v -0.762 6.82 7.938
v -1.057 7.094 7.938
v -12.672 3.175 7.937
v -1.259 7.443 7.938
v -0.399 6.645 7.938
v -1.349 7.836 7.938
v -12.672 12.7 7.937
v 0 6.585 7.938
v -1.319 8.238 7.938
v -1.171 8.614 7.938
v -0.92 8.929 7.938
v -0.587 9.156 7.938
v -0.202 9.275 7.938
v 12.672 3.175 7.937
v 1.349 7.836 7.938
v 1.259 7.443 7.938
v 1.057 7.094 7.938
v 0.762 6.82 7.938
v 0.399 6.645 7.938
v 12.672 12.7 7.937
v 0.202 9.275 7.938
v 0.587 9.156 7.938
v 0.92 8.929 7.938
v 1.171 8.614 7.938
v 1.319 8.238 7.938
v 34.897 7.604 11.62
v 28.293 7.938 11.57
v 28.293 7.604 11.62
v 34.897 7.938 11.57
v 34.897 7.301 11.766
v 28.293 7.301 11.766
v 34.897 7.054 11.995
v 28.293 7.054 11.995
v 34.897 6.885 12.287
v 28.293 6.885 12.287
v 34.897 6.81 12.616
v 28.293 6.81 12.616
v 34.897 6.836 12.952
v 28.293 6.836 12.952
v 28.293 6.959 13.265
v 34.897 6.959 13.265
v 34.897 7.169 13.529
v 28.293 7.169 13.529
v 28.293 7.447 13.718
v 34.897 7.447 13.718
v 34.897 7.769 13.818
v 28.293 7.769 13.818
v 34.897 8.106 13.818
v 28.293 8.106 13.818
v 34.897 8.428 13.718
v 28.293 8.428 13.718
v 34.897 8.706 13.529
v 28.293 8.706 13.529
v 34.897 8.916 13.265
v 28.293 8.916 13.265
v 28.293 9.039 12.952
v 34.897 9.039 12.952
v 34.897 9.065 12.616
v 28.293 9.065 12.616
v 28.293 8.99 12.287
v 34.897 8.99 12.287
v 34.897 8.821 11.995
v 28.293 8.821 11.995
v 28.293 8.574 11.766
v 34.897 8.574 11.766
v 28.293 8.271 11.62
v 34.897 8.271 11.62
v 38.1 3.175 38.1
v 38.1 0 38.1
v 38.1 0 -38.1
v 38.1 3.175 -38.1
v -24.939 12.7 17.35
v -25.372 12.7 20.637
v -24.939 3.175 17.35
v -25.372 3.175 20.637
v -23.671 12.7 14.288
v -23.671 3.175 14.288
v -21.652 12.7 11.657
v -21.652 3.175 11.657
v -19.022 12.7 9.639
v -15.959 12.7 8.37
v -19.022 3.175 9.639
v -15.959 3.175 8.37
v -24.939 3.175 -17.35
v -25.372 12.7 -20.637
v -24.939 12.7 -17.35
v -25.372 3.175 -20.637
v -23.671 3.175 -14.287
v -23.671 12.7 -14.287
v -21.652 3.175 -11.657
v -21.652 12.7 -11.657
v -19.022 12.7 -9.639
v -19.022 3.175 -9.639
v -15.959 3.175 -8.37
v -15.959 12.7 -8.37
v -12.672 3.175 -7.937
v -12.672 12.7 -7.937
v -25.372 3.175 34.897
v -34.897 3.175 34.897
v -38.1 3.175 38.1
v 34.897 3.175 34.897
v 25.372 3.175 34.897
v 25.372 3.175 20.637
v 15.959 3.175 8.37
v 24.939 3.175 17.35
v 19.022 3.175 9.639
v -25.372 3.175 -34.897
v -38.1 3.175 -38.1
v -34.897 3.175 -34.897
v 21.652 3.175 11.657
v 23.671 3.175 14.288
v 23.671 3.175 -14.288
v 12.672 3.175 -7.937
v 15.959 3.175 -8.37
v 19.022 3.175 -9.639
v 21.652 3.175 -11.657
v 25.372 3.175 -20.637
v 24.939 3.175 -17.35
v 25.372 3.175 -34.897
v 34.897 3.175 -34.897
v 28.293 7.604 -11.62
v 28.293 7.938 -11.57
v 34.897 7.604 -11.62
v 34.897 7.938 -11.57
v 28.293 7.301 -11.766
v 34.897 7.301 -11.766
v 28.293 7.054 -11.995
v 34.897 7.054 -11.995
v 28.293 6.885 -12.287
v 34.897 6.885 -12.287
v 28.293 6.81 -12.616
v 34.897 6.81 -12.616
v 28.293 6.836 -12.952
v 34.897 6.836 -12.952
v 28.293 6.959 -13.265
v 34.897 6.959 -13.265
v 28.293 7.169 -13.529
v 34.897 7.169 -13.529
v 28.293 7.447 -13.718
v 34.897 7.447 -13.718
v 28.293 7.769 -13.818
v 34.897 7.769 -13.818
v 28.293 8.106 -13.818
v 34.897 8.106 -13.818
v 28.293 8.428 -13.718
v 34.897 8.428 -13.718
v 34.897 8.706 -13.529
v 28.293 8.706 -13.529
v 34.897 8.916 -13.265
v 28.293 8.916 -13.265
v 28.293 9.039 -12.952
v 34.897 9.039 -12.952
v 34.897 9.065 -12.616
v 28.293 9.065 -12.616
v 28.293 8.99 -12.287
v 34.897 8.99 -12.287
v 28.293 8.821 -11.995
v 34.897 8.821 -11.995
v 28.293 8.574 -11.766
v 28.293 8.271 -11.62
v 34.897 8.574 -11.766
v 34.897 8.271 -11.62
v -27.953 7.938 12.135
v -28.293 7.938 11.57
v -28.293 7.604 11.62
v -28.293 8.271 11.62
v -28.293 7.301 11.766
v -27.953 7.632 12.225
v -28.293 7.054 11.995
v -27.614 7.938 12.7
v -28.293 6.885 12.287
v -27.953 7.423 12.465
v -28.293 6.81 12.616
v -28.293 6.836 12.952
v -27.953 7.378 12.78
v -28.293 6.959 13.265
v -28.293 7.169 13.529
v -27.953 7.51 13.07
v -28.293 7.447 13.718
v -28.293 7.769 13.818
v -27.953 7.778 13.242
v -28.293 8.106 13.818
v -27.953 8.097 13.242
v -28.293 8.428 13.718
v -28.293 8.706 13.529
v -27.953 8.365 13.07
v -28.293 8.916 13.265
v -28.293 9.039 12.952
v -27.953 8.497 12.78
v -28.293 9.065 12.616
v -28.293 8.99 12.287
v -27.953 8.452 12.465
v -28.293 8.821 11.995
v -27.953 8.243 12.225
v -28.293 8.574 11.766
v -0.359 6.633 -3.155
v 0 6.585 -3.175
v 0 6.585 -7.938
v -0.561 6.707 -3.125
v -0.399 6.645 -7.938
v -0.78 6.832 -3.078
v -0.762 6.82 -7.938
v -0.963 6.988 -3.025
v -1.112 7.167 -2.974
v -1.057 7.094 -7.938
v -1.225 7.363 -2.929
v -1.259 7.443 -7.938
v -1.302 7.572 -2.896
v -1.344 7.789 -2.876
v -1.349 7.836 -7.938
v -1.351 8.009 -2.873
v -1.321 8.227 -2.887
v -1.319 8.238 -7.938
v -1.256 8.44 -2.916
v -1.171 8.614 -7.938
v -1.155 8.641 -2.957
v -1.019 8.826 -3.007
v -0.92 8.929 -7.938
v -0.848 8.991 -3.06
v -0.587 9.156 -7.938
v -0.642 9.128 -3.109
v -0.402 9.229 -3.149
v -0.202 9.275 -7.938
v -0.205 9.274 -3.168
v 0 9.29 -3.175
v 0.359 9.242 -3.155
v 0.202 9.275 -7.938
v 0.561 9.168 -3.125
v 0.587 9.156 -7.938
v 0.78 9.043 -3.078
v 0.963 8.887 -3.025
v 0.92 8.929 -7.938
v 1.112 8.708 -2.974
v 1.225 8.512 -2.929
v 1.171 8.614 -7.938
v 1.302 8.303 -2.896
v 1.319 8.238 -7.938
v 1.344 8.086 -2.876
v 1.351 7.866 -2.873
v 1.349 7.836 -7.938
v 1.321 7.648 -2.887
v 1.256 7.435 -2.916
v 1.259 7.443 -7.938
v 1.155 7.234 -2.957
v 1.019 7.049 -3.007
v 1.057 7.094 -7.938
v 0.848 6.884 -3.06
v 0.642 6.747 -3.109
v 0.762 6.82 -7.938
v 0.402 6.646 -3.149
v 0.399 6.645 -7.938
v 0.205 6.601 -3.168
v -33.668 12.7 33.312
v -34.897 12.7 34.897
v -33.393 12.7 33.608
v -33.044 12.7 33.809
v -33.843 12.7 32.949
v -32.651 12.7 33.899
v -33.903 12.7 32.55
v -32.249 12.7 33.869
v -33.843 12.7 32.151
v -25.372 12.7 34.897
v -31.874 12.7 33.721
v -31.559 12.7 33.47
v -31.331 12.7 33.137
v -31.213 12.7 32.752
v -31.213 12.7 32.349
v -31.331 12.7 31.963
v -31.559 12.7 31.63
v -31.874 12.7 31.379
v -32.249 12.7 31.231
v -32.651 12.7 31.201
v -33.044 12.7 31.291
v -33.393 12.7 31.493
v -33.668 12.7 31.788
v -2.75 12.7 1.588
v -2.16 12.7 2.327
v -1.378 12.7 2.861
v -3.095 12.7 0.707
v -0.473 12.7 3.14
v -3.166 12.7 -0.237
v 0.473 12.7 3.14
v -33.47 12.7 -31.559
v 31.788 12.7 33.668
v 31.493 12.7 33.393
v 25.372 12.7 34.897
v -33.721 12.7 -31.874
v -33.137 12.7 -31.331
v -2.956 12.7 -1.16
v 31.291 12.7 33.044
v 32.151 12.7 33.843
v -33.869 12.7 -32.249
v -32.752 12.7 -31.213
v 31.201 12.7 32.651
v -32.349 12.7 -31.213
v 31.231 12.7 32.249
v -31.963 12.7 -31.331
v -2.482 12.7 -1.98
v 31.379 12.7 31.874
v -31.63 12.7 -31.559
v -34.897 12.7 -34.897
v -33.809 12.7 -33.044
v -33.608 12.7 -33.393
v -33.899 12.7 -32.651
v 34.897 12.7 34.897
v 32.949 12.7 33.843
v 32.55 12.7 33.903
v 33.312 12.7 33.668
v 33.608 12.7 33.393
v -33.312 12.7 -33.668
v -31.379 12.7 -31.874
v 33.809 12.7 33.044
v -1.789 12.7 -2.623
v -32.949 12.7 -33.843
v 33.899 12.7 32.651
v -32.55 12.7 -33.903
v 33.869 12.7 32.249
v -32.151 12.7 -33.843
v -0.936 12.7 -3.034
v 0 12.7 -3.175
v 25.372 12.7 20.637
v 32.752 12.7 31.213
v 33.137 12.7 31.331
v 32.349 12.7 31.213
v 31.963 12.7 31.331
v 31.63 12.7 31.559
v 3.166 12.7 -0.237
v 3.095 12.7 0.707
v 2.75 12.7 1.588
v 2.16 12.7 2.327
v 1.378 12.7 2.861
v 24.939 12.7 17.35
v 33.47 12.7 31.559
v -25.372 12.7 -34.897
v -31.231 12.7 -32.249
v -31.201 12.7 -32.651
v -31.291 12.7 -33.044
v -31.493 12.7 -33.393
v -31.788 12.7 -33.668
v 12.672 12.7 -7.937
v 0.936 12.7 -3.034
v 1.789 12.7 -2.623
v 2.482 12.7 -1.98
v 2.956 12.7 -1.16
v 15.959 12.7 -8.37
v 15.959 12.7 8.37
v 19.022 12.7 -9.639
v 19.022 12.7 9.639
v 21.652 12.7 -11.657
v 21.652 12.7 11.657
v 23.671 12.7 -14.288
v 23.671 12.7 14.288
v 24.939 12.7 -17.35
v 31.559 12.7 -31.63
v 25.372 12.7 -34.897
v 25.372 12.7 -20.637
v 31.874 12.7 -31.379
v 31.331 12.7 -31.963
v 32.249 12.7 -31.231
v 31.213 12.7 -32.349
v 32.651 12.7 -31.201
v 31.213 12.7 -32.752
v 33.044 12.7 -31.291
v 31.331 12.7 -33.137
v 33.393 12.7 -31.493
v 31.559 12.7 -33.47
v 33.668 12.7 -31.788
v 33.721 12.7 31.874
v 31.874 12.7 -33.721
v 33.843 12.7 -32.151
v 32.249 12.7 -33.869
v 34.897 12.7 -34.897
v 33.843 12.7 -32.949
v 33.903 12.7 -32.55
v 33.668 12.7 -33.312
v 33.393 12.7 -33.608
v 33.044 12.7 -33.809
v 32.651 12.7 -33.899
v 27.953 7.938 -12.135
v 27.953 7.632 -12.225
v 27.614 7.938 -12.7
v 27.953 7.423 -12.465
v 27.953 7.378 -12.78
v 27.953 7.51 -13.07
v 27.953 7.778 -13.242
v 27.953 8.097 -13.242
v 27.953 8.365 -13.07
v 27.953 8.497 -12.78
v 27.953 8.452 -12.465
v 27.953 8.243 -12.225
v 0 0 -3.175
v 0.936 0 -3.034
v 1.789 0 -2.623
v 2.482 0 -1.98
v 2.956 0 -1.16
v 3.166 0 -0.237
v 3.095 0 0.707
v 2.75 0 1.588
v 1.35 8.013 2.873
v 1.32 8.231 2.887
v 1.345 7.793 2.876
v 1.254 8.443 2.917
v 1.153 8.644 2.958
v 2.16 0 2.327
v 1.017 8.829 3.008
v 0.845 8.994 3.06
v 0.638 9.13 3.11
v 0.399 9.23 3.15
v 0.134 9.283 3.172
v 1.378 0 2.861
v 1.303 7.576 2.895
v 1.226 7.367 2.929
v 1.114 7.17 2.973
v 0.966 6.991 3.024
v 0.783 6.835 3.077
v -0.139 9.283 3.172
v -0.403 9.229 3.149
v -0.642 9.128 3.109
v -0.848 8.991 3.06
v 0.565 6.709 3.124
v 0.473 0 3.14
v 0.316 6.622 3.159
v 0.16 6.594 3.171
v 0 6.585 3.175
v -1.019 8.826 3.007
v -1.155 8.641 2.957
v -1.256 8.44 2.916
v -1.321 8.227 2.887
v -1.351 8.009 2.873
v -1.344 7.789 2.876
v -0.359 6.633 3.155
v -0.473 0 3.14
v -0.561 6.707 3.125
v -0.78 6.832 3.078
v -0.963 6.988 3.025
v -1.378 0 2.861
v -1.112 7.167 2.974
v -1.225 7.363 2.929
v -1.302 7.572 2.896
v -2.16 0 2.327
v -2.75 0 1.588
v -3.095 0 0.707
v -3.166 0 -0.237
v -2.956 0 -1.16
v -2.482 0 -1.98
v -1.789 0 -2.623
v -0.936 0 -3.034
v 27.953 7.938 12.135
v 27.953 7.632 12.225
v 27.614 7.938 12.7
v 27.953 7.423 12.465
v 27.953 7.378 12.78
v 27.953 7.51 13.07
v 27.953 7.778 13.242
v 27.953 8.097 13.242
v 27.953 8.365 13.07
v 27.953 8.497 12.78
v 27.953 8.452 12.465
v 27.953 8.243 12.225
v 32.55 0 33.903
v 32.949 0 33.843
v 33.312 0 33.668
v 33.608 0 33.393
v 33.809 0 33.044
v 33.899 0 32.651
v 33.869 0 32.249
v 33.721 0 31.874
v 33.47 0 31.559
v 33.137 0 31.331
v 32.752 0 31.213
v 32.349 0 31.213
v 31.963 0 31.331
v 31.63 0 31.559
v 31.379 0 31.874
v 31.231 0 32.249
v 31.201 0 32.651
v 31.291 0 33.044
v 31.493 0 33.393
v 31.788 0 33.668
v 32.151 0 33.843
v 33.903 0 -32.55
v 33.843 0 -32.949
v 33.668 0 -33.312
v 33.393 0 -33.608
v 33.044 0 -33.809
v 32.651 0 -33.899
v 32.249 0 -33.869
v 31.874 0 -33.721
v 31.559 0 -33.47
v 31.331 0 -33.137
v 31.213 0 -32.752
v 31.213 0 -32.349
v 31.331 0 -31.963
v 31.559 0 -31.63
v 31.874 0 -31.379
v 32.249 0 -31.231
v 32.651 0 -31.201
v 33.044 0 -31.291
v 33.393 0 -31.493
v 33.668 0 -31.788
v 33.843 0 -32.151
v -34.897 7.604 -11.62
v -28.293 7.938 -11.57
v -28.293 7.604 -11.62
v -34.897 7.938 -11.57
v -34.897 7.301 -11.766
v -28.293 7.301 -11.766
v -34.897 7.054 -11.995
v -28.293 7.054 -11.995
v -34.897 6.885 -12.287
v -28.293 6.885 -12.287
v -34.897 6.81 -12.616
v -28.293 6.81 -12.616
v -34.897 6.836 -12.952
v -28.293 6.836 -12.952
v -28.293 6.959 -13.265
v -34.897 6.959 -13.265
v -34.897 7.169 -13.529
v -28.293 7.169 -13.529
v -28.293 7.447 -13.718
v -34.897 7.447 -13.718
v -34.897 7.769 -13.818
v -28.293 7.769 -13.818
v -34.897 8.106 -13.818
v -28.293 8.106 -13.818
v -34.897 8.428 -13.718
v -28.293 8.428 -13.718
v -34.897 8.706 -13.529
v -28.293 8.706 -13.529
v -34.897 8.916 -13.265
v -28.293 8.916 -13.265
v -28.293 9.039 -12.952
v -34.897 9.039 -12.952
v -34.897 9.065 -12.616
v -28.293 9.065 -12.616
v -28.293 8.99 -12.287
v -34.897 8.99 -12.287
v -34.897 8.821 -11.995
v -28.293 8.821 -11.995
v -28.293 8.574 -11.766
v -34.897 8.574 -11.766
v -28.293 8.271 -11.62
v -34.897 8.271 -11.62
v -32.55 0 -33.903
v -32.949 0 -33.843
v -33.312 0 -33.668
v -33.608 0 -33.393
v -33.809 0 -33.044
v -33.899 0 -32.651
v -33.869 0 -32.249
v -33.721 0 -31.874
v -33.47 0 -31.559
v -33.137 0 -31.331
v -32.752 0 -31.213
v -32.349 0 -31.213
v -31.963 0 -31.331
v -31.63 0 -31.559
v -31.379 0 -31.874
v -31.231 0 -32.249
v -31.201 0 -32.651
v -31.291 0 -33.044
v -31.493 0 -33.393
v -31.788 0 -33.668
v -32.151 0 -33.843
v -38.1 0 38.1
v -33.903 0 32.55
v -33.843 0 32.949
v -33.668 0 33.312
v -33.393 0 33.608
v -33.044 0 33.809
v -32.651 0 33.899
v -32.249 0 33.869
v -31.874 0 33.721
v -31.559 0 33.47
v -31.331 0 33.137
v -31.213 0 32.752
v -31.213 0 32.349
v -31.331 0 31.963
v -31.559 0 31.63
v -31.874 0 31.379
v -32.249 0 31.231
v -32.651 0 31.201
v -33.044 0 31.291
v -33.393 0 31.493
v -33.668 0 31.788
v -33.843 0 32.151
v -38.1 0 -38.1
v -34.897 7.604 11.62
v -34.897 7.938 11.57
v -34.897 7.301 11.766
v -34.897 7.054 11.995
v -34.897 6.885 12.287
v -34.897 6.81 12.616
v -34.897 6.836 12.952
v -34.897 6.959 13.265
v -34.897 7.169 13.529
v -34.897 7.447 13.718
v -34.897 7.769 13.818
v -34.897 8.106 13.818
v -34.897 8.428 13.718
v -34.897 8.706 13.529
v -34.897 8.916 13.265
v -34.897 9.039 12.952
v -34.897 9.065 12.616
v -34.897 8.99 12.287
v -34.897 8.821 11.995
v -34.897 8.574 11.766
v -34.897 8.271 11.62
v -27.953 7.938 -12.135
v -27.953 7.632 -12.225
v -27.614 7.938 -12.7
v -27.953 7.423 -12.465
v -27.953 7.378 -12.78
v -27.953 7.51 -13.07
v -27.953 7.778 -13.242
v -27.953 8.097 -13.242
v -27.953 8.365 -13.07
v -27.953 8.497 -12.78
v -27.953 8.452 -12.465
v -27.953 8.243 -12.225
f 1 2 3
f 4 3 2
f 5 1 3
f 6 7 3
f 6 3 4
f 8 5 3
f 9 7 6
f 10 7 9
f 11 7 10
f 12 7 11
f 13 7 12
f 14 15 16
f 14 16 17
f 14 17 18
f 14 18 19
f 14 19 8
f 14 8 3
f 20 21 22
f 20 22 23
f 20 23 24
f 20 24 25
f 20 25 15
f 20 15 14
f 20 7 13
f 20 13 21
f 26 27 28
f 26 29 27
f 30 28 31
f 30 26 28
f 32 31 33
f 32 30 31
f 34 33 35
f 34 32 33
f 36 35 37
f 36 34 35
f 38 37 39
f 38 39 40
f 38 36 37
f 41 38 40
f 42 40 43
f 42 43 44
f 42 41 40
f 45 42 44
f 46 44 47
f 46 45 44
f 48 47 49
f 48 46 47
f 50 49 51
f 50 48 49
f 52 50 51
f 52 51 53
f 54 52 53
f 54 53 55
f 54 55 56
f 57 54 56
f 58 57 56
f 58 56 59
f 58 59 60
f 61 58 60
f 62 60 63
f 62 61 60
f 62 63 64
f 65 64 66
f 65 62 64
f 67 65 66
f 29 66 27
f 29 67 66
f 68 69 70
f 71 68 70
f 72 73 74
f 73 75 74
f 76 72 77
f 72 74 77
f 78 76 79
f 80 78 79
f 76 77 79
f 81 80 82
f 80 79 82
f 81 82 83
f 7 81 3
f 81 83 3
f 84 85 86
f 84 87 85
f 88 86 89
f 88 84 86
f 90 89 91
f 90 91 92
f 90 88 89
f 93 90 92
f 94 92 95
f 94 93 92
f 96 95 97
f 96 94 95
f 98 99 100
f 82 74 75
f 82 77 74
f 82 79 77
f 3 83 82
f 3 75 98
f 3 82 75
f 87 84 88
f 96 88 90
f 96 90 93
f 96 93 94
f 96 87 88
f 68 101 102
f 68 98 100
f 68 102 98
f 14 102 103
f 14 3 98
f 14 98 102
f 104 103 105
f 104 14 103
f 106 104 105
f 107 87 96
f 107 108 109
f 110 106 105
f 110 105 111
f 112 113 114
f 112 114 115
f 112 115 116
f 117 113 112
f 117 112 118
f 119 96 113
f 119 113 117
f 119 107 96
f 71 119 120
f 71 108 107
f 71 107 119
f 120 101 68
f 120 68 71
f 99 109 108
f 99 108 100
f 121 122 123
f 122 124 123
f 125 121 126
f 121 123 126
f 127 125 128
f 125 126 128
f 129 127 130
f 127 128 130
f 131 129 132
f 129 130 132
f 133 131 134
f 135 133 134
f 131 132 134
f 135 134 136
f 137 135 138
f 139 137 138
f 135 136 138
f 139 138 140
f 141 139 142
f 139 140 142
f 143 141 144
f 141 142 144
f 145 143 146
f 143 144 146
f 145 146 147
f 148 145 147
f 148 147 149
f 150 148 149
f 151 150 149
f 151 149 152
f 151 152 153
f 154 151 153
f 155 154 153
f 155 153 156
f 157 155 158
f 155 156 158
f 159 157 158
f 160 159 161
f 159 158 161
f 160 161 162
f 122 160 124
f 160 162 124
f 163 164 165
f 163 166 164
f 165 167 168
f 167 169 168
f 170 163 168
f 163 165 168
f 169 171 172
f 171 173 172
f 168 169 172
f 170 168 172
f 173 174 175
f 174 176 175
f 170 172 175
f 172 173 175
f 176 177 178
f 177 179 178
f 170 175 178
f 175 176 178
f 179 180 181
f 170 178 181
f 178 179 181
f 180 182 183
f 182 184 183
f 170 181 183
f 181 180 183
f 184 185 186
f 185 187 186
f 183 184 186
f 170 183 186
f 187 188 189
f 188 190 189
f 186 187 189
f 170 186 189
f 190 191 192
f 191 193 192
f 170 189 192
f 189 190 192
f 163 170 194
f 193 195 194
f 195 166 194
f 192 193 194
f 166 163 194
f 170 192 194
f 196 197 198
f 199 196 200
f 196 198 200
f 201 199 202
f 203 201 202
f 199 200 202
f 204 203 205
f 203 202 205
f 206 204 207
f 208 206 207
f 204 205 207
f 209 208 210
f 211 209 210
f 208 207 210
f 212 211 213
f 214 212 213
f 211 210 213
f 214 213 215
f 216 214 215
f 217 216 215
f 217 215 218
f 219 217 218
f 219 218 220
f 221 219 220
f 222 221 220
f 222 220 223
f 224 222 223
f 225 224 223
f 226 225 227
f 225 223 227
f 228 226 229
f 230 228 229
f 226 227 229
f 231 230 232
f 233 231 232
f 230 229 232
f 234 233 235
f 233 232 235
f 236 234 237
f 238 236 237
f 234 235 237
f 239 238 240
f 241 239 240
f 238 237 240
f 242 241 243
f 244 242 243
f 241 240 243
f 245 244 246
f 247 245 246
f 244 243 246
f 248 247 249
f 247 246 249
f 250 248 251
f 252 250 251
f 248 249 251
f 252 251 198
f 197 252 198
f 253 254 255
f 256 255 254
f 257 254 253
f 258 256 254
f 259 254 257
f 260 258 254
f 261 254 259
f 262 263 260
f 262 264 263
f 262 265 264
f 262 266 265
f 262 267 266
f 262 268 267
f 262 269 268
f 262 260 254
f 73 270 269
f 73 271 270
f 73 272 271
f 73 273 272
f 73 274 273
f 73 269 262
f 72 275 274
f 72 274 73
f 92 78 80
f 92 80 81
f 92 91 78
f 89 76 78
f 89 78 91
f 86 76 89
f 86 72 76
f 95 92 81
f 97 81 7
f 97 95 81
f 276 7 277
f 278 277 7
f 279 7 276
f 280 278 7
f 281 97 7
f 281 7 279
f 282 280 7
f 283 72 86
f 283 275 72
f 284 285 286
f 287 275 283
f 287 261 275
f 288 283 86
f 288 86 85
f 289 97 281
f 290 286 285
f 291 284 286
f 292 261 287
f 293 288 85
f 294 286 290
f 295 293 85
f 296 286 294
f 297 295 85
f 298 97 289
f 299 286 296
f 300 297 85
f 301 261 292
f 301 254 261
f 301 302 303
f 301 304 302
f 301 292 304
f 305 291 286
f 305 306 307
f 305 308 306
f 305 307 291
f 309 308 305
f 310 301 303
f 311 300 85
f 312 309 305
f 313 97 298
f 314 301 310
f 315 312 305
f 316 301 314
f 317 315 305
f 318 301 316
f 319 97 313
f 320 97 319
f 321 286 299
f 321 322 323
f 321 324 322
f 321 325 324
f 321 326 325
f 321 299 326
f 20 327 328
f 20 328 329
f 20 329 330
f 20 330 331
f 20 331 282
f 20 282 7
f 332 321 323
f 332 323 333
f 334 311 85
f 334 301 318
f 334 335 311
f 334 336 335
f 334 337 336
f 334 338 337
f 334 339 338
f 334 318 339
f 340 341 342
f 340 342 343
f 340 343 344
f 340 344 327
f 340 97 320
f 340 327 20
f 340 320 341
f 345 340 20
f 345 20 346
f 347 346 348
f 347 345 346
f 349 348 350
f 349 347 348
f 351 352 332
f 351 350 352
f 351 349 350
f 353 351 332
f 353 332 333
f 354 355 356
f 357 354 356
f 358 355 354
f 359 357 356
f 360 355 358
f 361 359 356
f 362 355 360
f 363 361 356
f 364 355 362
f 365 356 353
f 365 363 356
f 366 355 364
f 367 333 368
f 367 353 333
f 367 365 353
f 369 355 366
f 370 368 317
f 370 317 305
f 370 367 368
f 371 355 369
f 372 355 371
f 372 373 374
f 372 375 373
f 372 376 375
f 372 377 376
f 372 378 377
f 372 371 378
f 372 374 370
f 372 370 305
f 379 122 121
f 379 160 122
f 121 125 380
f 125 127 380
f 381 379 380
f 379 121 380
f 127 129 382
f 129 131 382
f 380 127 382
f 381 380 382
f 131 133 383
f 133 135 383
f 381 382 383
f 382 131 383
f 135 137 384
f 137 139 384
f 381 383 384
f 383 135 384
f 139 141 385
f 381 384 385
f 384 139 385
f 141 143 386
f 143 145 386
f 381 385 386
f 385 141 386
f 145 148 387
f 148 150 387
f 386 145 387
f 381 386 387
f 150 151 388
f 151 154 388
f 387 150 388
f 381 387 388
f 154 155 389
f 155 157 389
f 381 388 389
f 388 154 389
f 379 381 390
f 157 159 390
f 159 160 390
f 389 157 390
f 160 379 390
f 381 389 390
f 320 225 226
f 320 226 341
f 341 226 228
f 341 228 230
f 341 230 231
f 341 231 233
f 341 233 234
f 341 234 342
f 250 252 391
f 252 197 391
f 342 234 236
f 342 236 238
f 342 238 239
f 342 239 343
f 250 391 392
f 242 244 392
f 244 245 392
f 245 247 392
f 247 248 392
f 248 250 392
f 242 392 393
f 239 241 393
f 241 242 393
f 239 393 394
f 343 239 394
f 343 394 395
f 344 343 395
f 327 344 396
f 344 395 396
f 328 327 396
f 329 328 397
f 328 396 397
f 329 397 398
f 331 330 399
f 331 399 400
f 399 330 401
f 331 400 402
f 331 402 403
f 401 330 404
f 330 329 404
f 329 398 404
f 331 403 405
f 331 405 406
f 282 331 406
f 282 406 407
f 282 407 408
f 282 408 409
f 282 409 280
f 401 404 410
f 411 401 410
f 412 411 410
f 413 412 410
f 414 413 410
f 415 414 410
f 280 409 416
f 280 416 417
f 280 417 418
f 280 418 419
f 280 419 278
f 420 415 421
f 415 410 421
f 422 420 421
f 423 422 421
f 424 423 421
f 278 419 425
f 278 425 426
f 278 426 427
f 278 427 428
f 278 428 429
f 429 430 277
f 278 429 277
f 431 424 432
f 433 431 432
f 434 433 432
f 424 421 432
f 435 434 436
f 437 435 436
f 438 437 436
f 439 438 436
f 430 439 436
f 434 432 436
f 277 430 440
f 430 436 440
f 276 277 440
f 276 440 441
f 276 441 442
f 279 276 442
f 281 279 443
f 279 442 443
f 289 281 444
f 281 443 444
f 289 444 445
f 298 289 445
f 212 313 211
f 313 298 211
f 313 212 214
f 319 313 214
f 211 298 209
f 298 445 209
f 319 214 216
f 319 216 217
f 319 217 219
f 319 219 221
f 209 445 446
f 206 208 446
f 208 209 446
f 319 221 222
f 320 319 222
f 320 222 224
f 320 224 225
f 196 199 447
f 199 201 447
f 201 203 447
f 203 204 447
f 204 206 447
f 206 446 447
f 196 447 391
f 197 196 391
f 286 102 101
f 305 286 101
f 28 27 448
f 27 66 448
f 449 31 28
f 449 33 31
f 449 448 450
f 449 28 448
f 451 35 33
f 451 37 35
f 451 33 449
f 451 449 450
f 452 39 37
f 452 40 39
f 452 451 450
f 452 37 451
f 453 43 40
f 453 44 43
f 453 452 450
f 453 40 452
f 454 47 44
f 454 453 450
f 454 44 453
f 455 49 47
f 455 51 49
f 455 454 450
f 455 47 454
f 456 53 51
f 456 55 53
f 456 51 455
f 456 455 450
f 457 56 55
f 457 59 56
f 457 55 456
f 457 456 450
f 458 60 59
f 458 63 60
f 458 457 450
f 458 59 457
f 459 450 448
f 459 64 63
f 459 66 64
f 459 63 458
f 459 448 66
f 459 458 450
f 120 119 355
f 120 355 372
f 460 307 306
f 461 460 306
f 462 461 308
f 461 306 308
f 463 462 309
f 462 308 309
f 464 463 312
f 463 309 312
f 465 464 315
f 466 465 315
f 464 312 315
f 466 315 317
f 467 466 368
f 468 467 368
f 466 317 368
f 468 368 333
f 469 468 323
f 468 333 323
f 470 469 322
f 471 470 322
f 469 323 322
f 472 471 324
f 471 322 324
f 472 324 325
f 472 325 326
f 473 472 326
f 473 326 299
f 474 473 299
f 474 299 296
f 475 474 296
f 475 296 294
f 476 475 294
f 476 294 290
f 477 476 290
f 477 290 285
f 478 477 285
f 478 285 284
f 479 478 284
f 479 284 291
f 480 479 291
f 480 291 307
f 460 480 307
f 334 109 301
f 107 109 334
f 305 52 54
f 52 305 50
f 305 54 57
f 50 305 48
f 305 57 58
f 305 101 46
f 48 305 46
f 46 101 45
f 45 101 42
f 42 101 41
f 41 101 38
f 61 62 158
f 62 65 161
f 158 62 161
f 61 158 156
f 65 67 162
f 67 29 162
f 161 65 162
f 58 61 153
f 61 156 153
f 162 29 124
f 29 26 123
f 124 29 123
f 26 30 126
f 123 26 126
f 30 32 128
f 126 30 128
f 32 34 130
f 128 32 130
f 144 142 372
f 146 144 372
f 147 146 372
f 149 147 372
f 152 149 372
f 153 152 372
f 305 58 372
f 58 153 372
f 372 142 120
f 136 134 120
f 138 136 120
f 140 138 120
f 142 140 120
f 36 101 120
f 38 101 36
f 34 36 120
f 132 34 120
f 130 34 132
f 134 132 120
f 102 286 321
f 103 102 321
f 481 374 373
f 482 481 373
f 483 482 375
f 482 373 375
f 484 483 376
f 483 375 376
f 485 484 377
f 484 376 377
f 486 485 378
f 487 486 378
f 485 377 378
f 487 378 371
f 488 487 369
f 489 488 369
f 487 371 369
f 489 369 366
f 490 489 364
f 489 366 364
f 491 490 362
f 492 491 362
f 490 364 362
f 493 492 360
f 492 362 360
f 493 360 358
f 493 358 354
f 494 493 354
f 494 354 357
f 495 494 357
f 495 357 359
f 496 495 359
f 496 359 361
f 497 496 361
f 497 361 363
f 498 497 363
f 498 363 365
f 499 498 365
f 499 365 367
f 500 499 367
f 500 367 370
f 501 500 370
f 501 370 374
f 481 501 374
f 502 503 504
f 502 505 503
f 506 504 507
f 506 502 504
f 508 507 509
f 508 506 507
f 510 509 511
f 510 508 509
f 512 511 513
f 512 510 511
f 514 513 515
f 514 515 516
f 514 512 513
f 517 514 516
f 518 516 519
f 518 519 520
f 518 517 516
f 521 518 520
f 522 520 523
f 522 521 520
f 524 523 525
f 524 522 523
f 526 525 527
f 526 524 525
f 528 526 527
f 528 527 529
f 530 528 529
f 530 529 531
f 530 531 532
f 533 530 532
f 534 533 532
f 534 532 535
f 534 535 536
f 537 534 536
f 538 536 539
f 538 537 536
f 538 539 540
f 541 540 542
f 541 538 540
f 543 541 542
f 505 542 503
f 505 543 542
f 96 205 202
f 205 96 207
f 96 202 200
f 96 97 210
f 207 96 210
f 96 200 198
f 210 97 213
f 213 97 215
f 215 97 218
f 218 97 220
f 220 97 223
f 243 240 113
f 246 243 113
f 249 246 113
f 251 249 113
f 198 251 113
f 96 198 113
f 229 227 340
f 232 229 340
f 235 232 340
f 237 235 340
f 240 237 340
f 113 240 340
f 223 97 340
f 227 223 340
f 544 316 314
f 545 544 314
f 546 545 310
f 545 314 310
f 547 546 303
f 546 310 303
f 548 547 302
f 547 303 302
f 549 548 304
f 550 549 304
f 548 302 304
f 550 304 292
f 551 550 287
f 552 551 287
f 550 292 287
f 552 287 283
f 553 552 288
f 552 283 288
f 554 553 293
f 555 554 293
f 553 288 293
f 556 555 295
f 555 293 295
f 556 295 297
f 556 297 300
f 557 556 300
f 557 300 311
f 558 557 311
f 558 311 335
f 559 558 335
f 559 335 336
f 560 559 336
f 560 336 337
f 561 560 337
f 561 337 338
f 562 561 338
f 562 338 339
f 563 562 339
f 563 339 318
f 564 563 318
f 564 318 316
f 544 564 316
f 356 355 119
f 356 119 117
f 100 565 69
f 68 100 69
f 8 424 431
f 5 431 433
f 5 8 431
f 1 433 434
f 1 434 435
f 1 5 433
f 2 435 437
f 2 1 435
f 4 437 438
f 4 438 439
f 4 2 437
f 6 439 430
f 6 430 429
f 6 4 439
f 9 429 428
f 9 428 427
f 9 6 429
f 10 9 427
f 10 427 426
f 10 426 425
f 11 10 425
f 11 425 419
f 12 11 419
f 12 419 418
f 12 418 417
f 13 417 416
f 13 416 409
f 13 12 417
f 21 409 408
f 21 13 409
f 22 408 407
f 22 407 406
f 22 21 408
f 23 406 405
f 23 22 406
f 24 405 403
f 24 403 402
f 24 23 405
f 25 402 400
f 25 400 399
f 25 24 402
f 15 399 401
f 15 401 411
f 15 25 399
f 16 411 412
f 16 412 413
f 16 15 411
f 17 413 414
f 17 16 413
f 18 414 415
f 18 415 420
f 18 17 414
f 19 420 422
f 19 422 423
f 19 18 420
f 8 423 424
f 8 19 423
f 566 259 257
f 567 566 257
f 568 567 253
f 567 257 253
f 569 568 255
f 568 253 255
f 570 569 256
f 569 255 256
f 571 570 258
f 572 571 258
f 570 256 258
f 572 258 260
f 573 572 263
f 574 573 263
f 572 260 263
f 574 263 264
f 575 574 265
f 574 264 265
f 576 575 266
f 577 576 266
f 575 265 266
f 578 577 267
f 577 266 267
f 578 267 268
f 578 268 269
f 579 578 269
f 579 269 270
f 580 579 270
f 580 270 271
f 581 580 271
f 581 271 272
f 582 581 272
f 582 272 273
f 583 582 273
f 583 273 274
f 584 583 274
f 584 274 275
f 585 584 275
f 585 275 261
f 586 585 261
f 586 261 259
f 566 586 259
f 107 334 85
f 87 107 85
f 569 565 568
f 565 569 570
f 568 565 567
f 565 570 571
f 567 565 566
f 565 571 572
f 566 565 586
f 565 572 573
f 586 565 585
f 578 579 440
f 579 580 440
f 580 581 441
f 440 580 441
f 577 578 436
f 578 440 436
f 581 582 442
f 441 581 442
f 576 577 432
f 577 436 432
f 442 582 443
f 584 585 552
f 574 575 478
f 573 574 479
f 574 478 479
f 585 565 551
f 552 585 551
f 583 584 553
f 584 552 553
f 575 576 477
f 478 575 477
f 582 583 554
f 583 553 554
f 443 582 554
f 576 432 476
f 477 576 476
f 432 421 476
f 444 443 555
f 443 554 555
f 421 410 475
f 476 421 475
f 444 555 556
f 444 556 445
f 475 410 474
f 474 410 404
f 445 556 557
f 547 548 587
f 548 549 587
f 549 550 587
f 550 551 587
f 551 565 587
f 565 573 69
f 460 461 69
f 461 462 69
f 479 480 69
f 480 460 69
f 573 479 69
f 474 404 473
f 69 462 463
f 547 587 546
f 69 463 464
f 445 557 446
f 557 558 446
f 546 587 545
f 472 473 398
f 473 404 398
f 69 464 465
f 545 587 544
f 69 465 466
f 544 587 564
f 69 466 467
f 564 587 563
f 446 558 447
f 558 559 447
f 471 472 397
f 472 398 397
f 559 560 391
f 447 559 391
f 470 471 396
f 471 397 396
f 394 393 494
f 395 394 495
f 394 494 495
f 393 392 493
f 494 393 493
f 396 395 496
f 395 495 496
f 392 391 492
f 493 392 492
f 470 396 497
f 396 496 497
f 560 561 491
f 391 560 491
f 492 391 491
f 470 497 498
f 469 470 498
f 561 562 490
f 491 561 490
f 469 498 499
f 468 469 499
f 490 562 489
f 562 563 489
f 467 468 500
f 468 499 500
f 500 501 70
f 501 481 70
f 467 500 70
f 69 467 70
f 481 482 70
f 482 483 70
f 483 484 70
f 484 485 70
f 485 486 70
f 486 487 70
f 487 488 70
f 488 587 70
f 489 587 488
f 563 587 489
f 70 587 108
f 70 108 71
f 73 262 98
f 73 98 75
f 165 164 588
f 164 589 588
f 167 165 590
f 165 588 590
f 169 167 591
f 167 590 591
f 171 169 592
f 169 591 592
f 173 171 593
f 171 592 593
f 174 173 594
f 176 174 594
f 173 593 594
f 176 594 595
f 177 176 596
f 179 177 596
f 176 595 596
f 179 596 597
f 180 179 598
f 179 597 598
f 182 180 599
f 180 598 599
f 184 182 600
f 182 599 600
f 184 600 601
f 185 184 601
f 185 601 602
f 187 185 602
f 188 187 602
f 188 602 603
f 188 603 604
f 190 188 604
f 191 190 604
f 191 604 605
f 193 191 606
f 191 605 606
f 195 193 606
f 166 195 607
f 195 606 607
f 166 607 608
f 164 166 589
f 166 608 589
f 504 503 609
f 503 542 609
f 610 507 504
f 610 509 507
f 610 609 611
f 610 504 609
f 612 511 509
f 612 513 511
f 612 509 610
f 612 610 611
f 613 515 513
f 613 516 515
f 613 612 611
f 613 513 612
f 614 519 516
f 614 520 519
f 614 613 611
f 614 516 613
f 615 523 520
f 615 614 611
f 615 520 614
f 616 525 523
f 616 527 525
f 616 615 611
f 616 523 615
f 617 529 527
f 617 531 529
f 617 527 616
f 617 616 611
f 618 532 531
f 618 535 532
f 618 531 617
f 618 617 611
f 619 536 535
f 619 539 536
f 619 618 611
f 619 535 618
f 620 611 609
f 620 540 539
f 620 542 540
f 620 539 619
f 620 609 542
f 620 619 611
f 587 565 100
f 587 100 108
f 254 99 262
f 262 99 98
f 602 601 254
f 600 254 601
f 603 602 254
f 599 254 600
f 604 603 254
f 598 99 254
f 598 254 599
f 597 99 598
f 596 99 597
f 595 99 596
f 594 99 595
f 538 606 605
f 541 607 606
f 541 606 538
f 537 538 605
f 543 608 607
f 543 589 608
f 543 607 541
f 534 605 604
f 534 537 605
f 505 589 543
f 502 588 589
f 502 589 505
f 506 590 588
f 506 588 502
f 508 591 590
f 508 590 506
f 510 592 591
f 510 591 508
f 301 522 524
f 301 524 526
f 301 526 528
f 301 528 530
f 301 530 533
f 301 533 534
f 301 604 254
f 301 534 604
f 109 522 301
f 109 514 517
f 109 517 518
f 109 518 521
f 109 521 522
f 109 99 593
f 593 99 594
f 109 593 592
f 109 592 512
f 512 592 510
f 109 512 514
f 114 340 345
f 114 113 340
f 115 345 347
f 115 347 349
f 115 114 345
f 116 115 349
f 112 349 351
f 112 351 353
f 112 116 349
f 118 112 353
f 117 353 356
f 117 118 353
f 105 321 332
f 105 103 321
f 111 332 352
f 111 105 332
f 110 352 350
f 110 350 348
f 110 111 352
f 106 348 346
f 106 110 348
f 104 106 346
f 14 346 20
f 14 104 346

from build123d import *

# Parameters (mm, degrees)
SKETCH1_W             = 76.2
SKETCH1_H             = 76.2
BOSS_EXTRUDE1_DEPTH   = 3.175
SKETCH2_W             = 69.79412
SKETCH2_H             = 69.79412
BOSS_EXTRUDE2_DEPTH   = 9.525
F_6_32_TAPPED_HOLE1_D = 2.7051
CIRPATTERN1_COUNT     = 4
SKETCH14_R            = 3.175
CUT_EXTRUDE1_DEPTH    = 56.358016583
SKETCH15_W            = 50.74412
SKETCH15_H            = 26.95956
CUT_EXTRUDE2_DEPTH    = 9.525
FILLET1_R             = 12.7
FILLET1_OF_MIRROR3_R  = 12.7


with BuildPart() as part:
    # Sketch1 → Boss-Extrude1 (new body)
    with BuildSketch(Plane(origin=(0, 0, 0), x_dir=(1, 0, 0), z_dir=(0, 1, 0))):
        Rectangle(SKETCH1_W, SKETCH1_H)
    extrude(amount=BOSS_EXTRUDE1_DEPTH)

    # Sketch2 → Boss-Extrude2 (add)
    with BuildSketch(Plane(origin=(0, 3.175, 0), x_dir=(1, 0, 0), z_dir=(0, 1, 0))):
        Rectangle(SKETCH2_W, SKETCH2_H)
    extrude(amount=BOSS_EXTRUDE2_DEPTH)

    # Sketch9 → #4-40 Tapped Hole1 (revolve, cut)
    with BuildSketch(Plane(origin=(34.89706, 7.9375, 12.7), x_dir=(0, 0, -1), z_dir=(0, 1, 0))):
        Polygon((0, 0), (0, 7.283152758), (1.1303, 6.604), (1.1303, 0), align=None)
    f_4_40_tapped_hole1 = revolve(axis=Axis((41.24706, 7.9375, 12.7), (-1, 0, 0)), mode=Mode.SUBTRACT)

    # Mirror1: #4-40 Tapped Hole1 across plane
    add(f_4_40_tapped_hole1.mirror(Plane.XY), mode=Mode.SUBTRACT)

    # Mirror2 copy 1 sketch → Mirror2 copy 1 (revolve, cut)
    with BuildSketch(Plane(origin=(-34.89706, 7.9375, -12.7), x_dir=(0, 0, 1), z_dir=(0, 1, 0))):
        Polygon((0, 0), (0, 7.283152758), (1.1303, 6.604), (1.1303, 0), align=None)
    revolve(axis=Axis((-41.24706, 7.9375, -12.7), (1, 0, 0)), mode=Mode.SUBTRACT)

    # Mirror2 copy 2 sketch → Mirror2 copy 2 (revolve, cut)
    with BuildSketch(Plane(origin=(-34.89706, 7.9375, 12.7), x_dir=(0, 0, -1), z_dir=(0, 1, 0))):
        Polygon((0, 0), (0, -7.283152758), (1.1303, -6.604), (1.1303, 0), align=None)
    revolve(axis=Axis((-41.24706, 7.9375, 12.7), (-1, 0, 0)), mode=Mode.SUBTRACT)

    # #6-32 Tapped Hole1 (through all)
    with Locations(Plane(origin=(0, 0, 0), x_dir=(-1, 0, 0), z_dir=(0, -1, 0))):
        with Locations((-32.5501, 32.5501)):
            f_6_32_tapped_hole1 = Hole(F_6_32_TAPPED_HOLE1_D / 2)

    # CirPattern1: #6-32 Tapped Hole1 ×4 about axis
    cirpattern1_axis = Axis((0, -0.635, 0), (0, 1, 0))
    for i in range(1, CIRPATTERN1_COUNT):
        add(f_6_32_tapped_hole1.rotate(cirpattern1_axis, i * 360 / CIRPATTERN1_COUNT), mode=Mode.SUBTRACT)

    # Sketch14 → Cut-Extrude1 (cut, through all)
    with BuildSketch(Plane.XZ):
        Circle(SKETCH14_R)
    extrude(amount=-CUT_EXTRUDE1_DEPTH, mode=Mode.SUBTRACT)

    # Sketch15 → Cut-Extrude2 (cut)
    with BuildSketch(Plane(origin=(0, 12.7, 0), x_dir=(1, 0, 0), z_dir=(0, 1, 0))):
        with Locations((0, -21.41728)):
            Rectangle(SKETCH15_W, SKETCH15_H)
    cut_extrude2 = extrude(amount=-CUT_EXTRUDE2_DEPTH, mode=Mode.SUBTRACT)

    # Fillet1
    fillet1_edges = [part.edges().sort_by_distance(p)[0] for p in [
        (25.37206, 7.9375, 7.9375),
        (-25.37206, 7.9375, 7.9375),
    ]]
    fillet(fillet1_edges, radius=FILLET1_R)

    # Sketch17 → #6-32 Tapped Hole2 (revolve, cut)
    with BuildSketch(Plane(origin=(0, 7.9375, 7.9375), x_dir=(0, -1, 0), z_dir=(1, 0, 0))):
        Polygon((0, 0), (0, 10.46469403), (1.35255, 9.652), (1.35255, 0), align=None)
    f_6_32_tapped_hole2 = revolve(axis=Axis((0, 7.9375, 14.2875), (0, 0, -1)), mode=Mode.SUBTRACT)

    # Mirror3: Cut-Extrude2, #6-32 Tapped Hole2 across plane
    add(cut_extrude2.mirror(Plane.XY), mode=Mode.SUBTRACT)
    add(f_6_32_tapped_hole2.mirror(Plane.XY), mode=Mode.SUBTRACT)

    # Fillet1 of Mirror3
    fillet1_of_mirror3_edges = [part.edges().sort_by_distance(p)[0] for p in [
        (25.37206, 7.9375, -7.9375),
        (-25.37206, 7.9375, -7.9375),
    ]]
    fillet(fillet1_of_mirror3_edges, radius=FILLET1_OF_MIRROR3_R)


solid = part.part
